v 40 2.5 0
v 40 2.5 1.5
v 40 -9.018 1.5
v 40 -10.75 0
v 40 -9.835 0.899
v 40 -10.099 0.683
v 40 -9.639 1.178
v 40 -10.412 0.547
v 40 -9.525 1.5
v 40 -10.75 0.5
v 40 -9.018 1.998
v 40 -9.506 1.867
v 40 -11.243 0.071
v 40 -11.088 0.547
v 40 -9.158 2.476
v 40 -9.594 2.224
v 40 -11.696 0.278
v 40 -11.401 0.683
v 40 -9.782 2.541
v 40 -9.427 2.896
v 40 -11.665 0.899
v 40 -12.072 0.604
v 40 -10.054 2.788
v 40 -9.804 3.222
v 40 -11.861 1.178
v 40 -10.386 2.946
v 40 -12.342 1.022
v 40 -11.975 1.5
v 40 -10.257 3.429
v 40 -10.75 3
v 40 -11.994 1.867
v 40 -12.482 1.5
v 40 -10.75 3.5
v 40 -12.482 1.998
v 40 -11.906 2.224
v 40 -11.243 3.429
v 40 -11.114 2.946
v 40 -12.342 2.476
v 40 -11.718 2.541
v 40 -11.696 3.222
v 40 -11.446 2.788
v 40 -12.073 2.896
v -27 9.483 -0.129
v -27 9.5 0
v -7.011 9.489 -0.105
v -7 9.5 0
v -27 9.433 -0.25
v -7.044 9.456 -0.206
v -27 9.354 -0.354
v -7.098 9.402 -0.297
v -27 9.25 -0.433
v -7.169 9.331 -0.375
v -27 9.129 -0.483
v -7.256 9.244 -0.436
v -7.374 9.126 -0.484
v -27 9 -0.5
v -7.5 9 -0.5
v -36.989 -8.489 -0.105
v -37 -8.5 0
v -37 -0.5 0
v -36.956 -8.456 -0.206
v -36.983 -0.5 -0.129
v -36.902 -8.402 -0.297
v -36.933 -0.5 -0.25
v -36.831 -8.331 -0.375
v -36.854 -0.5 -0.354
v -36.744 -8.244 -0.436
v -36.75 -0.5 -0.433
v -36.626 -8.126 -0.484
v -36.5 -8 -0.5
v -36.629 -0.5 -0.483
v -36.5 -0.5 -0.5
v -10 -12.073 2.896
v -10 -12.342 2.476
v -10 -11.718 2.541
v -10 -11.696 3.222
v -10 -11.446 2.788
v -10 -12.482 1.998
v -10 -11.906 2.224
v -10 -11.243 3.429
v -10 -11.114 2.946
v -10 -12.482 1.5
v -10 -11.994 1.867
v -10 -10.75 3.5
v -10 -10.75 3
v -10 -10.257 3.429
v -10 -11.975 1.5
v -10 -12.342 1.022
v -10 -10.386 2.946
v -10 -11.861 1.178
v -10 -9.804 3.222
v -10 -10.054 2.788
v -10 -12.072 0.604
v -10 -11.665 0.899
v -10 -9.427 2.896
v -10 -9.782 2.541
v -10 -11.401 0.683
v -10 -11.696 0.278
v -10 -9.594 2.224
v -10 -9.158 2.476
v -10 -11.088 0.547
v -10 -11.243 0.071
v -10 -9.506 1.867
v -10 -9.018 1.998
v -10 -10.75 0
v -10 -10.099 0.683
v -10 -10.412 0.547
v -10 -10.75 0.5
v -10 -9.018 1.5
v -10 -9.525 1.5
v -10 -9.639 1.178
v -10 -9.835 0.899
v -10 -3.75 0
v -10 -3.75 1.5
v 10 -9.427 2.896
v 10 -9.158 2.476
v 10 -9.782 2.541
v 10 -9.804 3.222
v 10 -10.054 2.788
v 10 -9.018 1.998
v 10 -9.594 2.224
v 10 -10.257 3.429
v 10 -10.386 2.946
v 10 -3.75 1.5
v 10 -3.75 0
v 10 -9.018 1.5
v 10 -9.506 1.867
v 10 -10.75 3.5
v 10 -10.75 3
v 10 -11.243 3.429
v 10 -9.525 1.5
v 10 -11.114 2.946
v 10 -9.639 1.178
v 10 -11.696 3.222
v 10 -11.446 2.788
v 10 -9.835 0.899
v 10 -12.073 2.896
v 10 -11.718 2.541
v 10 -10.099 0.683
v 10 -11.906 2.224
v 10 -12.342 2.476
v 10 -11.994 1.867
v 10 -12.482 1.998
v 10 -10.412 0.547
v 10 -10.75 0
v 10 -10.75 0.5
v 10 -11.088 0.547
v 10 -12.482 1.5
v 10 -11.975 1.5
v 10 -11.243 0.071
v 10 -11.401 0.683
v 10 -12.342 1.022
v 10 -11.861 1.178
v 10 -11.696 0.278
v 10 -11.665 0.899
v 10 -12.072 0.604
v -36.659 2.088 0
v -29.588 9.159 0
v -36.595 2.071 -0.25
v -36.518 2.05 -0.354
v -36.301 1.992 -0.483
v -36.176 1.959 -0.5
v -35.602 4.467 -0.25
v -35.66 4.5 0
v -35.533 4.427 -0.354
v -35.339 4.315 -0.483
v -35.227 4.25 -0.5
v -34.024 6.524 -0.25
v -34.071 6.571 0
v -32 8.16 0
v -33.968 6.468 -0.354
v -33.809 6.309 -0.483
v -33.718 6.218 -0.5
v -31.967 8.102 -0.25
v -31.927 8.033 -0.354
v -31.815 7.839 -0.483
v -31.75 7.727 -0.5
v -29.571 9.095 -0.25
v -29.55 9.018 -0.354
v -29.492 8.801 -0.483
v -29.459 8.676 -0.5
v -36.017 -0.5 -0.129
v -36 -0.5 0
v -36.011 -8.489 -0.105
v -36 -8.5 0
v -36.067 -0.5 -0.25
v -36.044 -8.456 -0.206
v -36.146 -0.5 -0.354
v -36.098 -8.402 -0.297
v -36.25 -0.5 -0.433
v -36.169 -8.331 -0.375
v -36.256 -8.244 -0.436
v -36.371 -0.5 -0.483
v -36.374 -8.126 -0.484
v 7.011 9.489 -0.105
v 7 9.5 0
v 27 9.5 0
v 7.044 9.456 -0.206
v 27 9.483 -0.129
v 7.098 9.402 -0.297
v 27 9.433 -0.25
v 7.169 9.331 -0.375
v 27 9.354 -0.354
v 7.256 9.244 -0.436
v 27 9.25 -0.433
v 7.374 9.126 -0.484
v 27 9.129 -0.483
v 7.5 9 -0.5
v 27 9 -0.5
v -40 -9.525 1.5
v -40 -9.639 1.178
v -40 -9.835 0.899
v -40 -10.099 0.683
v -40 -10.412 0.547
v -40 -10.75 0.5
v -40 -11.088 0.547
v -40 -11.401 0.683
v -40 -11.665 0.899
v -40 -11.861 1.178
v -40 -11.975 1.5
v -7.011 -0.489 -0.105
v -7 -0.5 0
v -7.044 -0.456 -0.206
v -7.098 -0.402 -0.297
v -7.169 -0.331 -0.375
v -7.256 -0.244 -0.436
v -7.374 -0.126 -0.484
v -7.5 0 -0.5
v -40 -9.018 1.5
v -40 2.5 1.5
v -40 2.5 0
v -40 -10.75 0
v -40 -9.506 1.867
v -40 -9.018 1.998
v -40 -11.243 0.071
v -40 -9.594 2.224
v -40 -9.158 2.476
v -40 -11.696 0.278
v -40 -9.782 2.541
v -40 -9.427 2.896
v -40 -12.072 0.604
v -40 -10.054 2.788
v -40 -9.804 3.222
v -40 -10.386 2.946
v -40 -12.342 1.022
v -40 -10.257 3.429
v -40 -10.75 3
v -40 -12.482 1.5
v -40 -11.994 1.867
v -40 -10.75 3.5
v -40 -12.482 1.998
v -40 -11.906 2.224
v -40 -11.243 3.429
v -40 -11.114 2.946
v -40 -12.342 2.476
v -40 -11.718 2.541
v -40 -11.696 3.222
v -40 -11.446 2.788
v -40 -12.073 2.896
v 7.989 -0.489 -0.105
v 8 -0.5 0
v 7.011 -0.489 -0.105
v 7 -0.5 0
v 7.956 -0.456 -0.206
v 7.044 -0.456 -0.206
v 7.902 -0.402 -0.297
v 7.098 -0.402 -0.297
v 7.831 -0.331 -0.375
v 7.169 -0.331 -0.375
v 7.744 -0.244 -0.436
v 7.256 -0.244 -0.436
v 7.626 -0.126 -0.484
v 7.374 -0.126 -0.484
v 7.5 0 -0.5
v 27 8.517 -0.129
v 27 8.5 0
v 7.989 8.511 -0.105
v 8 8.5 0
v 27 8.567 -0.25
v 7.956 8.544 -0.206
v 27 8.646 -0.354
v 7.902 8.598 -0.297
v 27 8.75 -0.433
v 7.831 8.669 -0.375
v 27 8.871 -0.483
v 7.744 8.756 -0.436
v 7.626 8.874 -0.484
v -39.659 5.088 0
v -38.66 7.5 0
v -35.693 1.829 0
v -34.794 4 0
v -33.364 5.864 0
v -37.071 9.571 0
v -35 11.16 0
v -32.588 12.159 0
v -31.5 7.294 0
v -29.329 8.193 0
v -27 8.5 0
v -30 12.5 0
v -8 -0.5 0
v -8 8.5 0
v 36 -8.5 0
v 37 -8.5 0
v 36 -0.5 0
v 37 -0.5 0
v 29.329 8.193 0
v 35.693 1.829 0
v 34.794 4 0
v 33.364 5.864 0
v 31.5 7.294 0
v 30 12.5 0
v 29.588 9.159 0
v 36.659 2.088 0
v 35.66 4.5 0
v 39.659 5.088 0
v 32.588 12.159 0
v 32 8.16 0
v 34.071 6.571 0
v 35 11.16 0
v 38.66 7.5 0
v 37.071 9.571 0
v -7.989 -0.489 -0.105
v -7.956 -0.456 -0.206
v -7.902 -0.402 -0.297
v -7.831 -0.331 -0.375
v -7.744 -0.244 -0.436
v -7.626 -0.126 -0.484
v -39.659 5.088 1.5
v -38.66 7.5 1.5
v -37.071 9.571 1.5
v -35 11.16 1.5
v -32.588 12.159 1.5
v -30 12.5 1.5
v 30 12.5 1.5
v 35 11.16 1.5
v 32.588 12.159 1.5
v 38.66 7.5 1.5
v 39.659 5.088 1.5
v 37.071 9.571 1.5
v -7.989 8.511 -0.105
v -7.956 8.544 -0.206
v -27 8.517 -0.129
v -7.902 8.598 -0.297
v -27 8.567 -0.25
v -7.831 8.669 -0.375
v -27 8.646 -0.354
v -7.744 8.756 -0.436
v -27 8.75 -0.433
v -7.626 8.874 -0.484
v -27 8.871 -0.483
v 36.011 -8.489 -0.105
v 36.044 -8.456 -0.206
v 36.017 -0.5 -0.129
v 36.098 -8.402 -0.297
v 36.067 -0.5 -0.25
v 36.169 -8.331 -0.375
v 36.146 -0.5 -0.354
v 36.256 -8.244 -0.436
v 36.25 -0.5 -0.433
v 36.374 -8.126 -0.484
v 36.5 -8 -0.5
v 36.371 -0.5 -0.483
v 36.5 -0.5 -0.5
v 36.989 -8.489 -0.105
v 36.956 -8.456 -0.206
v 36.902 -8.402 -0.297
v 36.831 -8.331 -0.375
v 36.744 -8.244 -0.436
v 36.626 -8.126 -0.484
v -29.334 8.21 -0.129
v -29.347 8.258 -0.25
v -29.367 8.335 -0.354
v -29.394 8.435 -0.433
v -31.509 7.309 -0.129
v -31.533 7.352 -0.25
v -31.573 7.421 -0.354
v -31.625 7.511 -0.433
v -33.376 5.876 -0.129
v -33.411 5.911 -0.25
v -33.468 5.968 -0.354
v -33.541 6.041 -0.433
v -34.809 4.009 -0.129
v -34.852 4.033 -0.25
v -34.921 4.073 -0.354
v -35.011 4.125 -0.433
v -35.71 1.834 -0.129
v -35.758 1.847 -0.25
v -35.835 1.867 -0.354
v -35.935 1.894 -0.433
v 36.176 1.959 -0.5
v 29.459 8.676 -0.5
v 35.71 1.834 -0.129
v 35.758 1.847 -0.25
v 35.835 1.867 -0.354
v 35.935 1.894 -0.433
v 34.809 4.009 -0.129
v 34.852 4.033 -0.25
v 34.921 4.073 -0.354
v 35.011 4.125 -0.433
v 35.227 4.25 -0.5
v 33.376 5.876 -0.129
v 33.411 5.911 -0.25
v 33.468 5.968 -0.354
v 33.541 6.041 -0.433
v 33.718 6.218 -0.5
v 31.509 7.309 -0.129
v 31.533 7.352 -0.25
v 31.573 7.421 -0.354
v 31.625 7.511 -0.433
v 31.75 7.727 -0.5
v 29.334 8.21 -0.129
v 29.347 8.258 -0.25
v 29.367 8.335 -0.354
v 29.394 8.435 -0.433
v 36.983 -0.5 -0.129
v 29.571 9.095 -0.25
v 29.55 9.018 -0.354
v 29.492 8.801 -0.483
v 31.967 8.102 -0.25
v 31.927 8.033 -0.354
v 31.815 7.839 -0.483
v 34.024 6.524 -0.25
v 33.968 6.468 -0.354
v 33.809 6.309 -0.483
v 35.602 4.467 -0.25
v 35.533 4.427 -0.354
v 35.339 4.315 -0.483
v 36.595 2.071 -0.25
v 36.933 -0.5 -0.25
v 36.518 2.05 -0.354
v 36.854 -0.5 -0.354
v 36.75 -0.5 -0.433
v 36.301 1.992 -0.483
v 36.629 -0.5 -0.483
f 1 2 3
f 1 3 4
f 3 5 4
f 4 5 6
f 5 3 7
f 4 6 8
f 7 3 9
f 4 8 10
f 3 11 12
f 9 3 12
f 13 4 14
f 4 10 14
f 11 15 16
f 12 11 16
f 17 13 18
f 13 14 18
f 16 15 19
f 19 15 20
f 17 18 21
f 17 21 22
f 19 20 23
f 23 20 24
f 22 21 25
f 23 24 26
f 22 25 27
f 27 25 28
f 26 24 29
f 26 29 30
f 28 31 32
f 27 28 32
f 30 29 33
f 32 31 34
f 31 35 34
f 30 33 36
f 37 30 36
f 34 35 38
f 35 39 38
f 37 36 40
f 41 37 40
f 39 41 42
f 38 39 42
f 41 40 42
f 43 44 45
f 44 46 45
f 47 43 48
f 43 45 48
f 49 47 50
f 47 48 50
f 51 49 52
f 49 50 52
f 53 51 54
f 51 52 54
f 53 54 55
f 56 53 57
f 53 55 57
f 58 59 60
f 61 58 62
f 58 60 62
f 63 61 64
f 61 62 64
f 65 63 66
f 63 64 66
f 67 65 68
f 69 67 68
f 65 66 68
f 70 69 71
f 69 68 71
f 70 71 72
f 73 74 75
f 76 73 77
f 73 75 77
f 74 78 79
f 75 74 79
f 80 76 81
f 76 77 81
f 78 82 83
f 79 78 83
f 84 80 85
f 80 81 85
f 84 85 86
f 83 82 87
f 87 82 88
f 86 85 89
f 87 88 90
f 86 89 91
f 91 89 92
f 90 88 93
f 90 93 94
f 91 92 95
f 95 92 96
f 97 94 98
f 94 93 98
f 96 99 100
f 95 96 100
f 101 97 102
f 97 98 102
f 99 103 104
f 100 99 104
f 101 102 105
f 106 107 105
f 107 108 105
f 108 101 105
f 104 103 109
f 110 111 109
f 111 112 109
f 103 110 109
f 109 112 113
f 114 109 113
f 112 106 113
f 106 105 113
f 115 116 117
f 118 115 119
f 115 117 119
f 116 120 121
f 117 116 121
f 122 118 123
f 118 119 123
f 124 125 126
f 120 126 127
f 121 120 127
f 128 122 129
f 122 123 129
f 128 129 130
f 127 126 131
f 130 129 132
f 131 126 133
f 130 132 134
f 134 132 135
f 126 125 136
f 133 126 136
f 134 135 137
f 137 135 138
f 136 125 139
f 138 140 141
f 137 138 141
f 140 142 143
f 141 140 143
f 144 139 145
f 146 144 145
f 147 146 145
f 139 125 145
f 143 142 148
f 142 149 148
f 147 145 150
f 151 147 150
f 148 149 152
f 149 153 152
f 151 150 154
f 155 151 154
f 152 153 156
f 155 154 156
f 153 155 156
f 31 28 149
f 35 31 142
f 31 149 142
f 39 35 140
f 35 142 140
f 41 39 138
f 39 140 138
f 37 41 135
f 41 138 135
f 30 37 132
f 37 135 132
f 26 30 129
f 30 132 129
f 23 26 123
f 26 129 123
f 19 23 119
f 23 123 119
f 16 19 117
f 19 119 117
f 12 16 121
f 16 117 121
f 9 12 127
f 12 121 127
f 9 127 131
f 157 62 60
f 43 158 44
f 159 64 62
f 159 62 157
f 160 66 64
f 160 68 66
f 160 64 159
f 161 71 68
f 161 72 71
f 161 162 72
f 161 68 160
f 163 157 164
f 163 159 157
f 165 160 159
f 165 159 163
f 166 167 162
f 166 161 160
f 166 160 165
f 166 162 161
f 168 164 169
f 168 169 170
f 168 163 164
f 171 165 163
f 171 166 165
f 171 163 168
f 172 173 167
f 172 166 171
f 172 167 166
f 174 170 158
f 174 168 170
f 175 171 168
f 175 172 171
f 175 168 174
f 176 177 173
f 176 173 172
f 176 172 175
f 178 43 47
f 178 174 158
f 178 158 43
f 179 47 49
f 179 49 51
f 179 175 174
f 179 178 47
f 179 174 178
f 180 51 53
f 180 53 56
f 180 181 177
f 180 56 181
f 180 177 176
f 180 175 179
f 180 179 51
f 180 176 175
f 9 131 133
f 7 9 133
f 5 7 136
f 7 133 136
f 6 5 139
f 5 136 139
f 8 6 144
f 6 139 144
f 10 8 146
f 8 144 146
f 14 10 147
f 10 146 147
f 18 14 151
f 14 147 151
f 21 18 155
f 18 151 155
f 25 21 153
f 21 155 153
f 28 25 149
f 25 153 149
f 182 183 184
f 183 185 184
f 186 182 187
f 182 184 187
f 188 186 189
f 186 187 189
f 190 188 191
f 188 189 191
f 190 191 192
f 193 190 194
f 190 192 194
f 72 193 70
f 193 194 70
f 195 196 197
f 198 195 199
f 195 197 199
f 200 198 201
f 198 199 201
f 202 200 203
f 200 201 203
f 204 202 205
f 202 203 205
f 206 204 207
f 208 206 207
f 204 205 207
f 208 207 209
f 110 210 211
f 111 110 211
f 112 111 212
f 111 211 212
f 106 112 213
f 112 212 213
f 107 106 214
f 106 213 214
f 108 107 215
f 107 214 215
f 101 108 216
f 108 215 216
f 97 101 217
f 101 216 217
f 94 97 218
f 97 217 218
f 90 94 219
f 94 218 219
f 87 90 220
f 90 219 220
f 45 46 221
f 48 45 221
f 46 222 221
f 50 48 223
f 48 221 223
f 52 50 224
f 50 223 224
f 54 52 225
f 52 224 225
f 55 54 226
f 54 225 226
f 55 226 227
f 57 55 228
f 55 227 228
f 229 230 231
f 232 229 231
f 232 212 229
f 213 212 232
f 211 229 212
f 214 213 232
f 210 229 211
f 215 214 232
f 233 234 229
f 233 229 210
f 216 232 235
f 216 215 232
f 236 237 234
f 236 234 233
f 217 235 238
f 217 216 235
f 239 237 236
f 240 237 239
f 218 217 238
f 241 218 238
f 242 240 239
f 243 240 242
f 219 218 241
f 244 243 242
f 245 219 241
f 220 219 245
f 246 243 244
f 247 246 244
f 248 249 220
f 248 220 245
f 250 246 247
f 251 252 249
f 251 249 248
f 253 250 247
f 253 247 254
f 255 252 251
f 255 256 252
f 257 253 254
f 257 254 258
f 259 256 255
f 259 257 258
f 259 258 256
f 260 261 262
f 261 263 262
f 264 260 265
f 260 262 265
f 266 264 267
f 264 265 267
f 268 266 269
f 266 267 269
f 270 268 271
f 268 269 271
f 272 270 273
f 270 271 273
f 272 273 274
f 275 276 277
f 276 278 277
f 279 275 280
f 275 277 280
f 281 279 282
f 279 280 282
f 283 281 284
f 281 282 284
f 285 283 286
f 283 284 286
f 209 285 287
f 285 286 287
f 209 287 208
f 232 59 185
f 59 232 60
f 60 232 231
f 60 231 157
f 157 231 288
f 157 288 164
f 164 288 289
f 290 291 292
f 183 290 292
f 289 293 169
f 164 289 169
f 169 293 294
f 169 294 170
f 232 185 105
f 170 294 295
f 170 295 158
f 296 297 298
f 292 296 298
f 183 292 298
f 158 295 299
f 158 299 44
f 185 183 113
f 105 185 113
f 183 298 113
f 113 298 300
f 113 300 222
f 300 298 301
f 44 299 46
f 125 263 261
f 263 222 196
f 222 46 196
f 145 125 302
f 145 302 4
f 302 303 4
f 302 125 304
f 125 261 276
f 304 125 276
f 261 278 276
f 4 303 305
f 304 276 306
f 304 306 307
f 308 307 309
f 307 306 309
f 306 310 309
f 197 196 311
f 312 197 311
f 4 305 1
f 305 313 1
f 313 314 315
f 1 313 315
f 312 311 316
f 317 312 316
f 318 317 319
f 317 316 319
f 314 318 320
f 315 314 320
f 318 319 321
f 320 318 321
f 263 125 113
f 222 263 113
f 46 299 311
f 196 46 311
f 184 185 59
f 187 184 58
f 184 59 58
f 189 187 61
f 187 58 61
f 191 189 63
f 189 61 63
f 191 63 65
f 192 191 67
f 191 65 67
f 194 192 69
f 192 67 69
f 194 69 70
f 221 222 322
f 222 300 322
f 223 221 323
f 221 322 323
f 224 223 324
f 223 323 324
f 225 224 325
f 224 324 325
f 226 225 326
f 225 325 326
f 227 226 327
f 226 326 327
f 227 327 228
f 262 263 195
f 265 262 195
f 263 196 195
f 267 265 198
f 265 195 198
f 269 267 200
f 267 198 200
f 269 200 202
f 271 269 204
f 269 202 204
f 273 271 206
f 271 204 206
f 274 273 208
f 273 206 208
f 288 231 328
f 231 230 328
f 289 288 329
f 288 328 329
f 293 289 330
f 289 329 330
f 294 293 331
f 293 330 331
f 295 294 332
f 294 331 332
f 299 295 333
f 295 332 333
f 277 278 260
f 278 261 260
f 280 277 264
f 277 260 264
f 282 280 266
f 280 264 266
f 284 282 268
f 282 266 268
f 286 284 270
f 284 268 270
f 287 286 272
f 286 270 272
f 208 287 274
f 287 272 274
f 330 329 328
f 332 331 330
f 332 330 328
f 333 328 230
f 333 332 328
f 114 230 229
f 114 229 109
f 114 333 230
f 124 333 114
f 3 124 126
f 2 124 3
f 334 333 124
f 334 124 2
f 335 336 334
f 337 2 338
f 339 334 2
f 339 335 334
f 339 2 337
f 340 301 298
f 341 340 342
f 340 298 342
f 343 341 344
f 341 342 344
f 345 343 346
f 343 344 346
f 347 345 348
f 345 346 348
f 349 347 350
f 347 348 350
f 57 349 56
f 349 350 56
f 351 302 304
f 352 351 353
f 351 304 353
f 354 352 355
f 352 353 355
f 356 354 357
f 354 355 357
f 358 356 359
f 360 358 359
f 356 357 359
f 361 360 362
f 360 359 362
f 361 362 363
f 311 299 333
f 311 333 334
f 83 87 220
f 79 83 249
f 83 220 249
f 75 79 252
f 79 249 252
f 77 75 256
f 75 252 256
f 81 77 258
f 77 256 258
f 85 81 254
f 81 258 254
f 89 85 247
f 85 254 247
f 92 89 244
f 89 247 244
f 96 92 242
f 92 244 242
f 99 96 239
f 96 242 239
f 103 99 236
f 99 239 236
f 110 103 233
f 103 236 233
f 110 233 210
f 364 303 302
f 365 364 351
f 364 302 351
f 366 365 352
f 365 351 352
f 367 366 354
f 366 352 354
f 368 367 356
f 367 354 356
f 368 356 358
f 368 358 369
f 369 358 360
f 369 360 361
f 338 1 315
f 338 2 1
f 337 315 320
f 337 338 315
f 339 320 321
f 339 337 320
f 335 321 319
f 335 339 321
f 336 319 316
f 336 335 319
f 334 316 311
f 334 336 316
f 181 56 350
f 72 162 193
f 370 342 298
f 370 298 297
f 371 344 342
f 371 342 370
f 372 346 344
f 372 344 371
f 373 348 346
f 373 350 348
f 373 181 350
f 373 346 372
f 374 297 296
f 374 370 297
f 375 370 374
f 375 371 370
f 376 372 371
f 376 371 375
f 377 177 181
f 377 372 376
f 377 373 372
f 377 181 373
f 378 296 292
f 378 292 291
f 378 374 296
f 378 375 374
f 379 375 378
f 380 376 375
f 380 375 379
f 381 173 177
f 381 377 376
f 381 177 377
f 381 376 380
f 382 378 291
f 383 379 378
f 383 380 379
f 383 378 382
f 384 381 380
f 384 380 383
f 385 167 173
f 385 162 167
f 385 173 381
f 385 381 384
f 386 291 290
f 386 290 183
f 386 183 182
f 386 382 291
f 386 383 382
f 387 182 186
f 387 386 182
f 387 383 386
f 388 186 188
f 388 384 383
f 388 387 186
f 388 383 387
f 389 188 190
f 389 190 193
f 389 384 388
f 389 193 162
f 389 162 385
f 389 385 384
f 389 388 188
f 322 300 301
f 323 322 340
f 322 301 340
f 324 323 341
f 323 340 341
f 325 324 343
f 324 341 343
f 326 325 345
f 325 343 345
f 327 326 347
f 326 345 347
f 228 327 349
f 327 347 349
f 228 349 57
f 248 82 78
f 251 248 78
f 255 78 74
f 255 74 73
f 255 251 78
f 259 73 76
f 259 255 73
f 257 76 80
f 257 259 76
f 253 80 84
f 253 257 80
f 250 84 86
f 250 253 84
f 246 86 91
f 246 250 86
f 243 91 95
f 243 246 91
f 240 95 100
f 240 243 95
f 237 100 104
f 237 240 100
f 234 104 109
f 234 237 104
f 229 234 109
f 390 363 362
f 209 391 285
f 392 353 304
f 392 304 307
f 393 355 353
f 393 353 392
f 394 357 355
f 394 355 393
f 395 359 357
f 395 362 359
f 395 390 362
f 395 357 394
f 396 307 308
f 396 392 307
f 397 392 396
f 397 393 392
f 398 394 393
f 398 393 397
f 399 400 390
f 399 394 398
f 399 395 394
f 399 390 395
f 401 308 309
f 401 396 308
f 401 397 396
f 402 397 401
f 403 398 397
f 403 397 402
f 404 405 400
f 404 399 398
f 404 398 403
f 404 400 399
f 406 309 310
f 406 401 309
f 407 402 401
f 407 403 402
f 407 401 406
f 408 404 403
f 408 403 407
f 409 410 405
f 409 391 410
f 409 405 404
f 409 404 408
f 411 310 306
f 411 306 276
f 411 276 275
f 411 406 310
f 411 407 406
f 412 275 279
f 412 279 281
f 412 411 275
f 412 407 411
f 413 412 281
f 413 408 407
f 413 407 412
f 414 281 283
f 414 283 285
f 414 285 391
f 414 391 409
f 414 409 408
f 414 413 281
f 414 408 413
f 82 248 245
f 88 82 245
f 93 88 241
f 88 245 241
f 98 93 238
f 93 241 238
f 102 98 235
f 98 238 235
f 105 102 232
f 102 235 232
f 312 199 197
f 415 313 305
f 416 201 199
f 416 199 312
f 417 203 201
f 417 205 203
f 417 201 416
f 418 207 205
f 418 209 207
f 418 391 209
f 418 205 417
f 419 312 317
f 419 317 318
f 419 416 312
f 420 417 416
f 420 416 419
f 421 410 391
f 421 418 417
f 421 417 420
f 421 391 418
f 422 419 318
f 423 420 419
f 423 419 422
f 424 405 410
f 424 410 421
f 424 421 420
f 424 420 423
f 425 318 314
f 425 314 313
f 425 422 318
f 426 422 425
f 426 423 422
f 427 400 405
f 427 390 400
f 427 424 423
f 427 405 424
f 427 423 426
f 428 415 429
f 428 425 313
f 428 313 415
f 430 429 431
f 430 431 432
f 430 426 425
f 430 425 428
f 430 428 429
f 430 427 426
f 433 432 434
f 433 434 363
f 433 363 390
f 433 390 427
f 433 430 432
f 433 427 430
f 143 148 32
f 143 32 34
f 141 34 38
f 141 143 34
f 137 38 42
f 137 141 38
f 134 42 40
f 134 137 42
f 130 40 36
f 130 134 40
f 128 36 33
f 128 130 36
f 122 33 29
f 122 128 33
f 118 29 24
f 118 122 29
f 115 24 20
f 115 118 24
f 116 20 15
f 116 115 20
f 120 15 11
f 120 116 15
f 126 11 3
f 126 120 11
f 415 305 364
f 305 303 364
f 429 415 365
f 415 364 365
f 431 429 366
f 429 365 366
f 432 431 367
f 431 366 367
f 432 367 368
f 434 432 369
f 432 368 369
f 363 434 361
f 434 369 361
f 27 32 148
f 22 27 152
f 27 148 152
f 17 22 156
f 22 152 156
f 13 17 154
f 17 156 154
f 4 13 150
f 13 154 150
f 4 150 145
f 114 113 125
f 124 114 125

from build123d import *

# Parameters (mm, degrees)
F0_W      = 80
F0_H      = 25
F1_DEPTH  = 1.5
F2_R      = 10
F4_DEPTH  = 80
F3_R      = 1.75
F3_R_2    = 1.25
F5_DEPTH  = 80
F6_DEPTH  = 80
F7_W      = 20
F7_H      = 18.6819097605
F7_H_2    = 7
F8_DEPTH  = 25
F10_DEPTH = 0.5
F11_R     = 0.49999


# Not quite as in the source:
# - a fillet or chamfer is up to 0.001 mm smaller than in the source, because OpenCascade refuses the exact size


with BuildPart() as f1:
    # F0 (on Top) → F1 (new body)
    with BuildSketch(Plane.XY):
        Rectangle(F0_W, F0_H)
    extrude(amount=F1_DEPTH)

    # F2
    f2_edges = [f1.edges().sort_by_distance(p)[0] for p in [
        (-40, 12.5, 0.75),
        (40, 12.5, 0.75),
    ]]
    fillet(f2_edges, radius=F2_R)

    # F3 (on face) → F4 (cut)
    with BuildSketch(Plane(origin=(-40, 0, 0), x_dir=(0, -1, 0), z_dir=(-1, 0, 0))):
        with BuildLine():
            Line((12.5, 1.5), (12.4820508076, 1.5))
            ThreePointArc((12.4820508076, 1.5), (11.8956439237, 0.4271243445), (10.75, 0))
            Line((10.75, 0), (12.5, 0))
            Line((12.5, 0), (12.5, 1.5))
        make_face()
        with BuildLine():
            ThreePointArc((12.4820508076, 1.5), (12.495506934, 1.6246782406), (12.5, 1.75))
            ThreePointArc((12.5, 1.75), (10.6246782406, 3.495506934), (9.0179491924, 1.5))
            Line((9.0179491924, 1.5), (9.5252551286, 1.5))
            ThreePointArc((9.5252551286, 1.5), (10.6243637975, 2.9936701913), (12, 1.75))
            ThreePointArc((12, 1.75), (11.9936701913, 1.6243637975), (11.9747448714, 1.5))
            Line((11.9747448714, 1.5), (12.4820508076, 1.5))
        make_face()
    extrude(amount=-F4_DEPTH, mode=Mode.SUBTRACT)

    # F3 (on face) → F5 (join)
    with BuildSketch(Plane(origin=(-40, 0, 0), x_dir=(0, -1, 0), z_dir=(-1, 0, 0))):
        with Locations((10.75, 1.75)):
            Circle(F3_R)
        with Locations((10.75, 1.75)):
            Circle(F3_R_2, mode=Mode.SUBTRACT)
    extrude(amount=-F5_DEPTH)

    # F3 (on face) → F6 (cut)
    with BuildSketch(Plane(origin=(-40, 0, 0), x_dir=(0, -1, 0), z_dir=(-1, 0, 0))):
        with BuildLine():
            Line((11.9747448714, 1.5), (9.5252551286, 1.5))
            ThreePointArc((9.5252551286, 1.5), (10.75, 0.5), (11.9747448714, 1.5))
        make_face()
        with BuildLine():
            ThreePointArc((12, 1.75), (10.6243637975, 2.9936701913), (9.5252551286, 1.5))
            Line((9.5252551286, 1.5), (11.9747448714, 1.5))
            ThreePointArc((11.9747448714, 1.5), (11.9936701913, 1.6243637975), (12, 1.75))
        make_face()
    extrude(amount=-F6_DEPTH, mode=Mode.SUBTRACT)

    # F7 (on face) → F8 (cut)
    with BuildSketch(Plane(origin=(0, 0, 0), x_dir=(1, 0, 0), z_dir=(0, 0, -1))):
        with Locations((0, 20.0909548802)):
            Rectangle(F7_W, F7_H)
        with Locations((0, 7.25)):
            Rectangle(F7_W, F7_H_2)
    extrude(amount=-F8_DEPTH, mode=Mode.SUBTRACT)

    # F9 (on face) → F10 (join)
    with BuildSketch(Plane(origin=(0, 0, 0), x_dir=(1, 0, 0), z_dir=(0, 0, -1))):
        with BuildLine():
            Line((-36, 8.5), (-37, 8.5))
            Line((-37, 8.5), (-37, 0.5))
            ThreePointArc((-37, 0.5), (-34.0710678119, -6.5710678119), (-27, -9.5))
            Line((-27, -9.5), (-7, -9.5))
            Line((-7, -9.5), (-7, 0.5))
            Line((-7, 0.5), (-8, 0.5))
            Line((-8, 0.5), (-8, -8.5))
            Line((-8, -8.5), (-27, -8.5))
            ThreePointArc((-27, -8.5), (-33.3639610307, -5.8639610307), (-36, 0.5))
            Line((-36, 0.5), (-36, 8.5))
        make_face()
        with BuildLine():
            Line((8, 0.5), (7, 0.5))
            Line((7, 0.5), (7, -9.5))
            Line((7, -9.5), (27, -9.5))
            ThreePointArc((27, -9.5), (34.0710678119, -6.5710678119), (37, 0.5))
            Line((37, 0.5), (37, 8.5))
            Line((37, 8.5), (36, 8.5))
            Line((36, 8.5), (36, 0.5))
            ThreePointArc((36, 0.5), (33.3639610307, -5.8639610307), (27, -8.5))
            Line((27, -8.5), (8, -8.5))
            Line((8, -8.5), (8, 0.5))
        make_face()
    extrude(amount=F10_DEPTH)

    # F11 (radius 0.5 in the source; OpenCascade refuses exactly that, so slightly less here)
    f11_edges = [f1.edges().sort_by_distance(p)[0] for p in [
        (-36, -4.5, -0.5),
        (-36.5, -8.5, -0.5),
        (-37, -4.5, -0.5),
        (-34.071068, 6.571068, -0.5),
        (-17, 9.5, -0.5),
        (-7, 4.5, -0.5),
        (-7.5, -0.5, -0.5),
        (-8, 4, -0.5),
        (-17.5, 8.5, -0.5),
        (-33.363961, 5.863961, -0.5),
        (17.5, 8.5, -0.5),
        (8, 4, -0.5),
        (7.5, -0.5, -0.5),
        (7, 4.5, -0.5),
        (17, 9.5, -0.5),
        (34.071068, 6.571068, -0.5),
        (37, -4.5, -0.5),
        (36.5, -8.5, -0.5),
        (36, -4.5, -0.5),
        (33.363961, 5.863961, -0.5),
    ]]
    fillet(f11_edges, radius=F11_R)


solid = f1.part
